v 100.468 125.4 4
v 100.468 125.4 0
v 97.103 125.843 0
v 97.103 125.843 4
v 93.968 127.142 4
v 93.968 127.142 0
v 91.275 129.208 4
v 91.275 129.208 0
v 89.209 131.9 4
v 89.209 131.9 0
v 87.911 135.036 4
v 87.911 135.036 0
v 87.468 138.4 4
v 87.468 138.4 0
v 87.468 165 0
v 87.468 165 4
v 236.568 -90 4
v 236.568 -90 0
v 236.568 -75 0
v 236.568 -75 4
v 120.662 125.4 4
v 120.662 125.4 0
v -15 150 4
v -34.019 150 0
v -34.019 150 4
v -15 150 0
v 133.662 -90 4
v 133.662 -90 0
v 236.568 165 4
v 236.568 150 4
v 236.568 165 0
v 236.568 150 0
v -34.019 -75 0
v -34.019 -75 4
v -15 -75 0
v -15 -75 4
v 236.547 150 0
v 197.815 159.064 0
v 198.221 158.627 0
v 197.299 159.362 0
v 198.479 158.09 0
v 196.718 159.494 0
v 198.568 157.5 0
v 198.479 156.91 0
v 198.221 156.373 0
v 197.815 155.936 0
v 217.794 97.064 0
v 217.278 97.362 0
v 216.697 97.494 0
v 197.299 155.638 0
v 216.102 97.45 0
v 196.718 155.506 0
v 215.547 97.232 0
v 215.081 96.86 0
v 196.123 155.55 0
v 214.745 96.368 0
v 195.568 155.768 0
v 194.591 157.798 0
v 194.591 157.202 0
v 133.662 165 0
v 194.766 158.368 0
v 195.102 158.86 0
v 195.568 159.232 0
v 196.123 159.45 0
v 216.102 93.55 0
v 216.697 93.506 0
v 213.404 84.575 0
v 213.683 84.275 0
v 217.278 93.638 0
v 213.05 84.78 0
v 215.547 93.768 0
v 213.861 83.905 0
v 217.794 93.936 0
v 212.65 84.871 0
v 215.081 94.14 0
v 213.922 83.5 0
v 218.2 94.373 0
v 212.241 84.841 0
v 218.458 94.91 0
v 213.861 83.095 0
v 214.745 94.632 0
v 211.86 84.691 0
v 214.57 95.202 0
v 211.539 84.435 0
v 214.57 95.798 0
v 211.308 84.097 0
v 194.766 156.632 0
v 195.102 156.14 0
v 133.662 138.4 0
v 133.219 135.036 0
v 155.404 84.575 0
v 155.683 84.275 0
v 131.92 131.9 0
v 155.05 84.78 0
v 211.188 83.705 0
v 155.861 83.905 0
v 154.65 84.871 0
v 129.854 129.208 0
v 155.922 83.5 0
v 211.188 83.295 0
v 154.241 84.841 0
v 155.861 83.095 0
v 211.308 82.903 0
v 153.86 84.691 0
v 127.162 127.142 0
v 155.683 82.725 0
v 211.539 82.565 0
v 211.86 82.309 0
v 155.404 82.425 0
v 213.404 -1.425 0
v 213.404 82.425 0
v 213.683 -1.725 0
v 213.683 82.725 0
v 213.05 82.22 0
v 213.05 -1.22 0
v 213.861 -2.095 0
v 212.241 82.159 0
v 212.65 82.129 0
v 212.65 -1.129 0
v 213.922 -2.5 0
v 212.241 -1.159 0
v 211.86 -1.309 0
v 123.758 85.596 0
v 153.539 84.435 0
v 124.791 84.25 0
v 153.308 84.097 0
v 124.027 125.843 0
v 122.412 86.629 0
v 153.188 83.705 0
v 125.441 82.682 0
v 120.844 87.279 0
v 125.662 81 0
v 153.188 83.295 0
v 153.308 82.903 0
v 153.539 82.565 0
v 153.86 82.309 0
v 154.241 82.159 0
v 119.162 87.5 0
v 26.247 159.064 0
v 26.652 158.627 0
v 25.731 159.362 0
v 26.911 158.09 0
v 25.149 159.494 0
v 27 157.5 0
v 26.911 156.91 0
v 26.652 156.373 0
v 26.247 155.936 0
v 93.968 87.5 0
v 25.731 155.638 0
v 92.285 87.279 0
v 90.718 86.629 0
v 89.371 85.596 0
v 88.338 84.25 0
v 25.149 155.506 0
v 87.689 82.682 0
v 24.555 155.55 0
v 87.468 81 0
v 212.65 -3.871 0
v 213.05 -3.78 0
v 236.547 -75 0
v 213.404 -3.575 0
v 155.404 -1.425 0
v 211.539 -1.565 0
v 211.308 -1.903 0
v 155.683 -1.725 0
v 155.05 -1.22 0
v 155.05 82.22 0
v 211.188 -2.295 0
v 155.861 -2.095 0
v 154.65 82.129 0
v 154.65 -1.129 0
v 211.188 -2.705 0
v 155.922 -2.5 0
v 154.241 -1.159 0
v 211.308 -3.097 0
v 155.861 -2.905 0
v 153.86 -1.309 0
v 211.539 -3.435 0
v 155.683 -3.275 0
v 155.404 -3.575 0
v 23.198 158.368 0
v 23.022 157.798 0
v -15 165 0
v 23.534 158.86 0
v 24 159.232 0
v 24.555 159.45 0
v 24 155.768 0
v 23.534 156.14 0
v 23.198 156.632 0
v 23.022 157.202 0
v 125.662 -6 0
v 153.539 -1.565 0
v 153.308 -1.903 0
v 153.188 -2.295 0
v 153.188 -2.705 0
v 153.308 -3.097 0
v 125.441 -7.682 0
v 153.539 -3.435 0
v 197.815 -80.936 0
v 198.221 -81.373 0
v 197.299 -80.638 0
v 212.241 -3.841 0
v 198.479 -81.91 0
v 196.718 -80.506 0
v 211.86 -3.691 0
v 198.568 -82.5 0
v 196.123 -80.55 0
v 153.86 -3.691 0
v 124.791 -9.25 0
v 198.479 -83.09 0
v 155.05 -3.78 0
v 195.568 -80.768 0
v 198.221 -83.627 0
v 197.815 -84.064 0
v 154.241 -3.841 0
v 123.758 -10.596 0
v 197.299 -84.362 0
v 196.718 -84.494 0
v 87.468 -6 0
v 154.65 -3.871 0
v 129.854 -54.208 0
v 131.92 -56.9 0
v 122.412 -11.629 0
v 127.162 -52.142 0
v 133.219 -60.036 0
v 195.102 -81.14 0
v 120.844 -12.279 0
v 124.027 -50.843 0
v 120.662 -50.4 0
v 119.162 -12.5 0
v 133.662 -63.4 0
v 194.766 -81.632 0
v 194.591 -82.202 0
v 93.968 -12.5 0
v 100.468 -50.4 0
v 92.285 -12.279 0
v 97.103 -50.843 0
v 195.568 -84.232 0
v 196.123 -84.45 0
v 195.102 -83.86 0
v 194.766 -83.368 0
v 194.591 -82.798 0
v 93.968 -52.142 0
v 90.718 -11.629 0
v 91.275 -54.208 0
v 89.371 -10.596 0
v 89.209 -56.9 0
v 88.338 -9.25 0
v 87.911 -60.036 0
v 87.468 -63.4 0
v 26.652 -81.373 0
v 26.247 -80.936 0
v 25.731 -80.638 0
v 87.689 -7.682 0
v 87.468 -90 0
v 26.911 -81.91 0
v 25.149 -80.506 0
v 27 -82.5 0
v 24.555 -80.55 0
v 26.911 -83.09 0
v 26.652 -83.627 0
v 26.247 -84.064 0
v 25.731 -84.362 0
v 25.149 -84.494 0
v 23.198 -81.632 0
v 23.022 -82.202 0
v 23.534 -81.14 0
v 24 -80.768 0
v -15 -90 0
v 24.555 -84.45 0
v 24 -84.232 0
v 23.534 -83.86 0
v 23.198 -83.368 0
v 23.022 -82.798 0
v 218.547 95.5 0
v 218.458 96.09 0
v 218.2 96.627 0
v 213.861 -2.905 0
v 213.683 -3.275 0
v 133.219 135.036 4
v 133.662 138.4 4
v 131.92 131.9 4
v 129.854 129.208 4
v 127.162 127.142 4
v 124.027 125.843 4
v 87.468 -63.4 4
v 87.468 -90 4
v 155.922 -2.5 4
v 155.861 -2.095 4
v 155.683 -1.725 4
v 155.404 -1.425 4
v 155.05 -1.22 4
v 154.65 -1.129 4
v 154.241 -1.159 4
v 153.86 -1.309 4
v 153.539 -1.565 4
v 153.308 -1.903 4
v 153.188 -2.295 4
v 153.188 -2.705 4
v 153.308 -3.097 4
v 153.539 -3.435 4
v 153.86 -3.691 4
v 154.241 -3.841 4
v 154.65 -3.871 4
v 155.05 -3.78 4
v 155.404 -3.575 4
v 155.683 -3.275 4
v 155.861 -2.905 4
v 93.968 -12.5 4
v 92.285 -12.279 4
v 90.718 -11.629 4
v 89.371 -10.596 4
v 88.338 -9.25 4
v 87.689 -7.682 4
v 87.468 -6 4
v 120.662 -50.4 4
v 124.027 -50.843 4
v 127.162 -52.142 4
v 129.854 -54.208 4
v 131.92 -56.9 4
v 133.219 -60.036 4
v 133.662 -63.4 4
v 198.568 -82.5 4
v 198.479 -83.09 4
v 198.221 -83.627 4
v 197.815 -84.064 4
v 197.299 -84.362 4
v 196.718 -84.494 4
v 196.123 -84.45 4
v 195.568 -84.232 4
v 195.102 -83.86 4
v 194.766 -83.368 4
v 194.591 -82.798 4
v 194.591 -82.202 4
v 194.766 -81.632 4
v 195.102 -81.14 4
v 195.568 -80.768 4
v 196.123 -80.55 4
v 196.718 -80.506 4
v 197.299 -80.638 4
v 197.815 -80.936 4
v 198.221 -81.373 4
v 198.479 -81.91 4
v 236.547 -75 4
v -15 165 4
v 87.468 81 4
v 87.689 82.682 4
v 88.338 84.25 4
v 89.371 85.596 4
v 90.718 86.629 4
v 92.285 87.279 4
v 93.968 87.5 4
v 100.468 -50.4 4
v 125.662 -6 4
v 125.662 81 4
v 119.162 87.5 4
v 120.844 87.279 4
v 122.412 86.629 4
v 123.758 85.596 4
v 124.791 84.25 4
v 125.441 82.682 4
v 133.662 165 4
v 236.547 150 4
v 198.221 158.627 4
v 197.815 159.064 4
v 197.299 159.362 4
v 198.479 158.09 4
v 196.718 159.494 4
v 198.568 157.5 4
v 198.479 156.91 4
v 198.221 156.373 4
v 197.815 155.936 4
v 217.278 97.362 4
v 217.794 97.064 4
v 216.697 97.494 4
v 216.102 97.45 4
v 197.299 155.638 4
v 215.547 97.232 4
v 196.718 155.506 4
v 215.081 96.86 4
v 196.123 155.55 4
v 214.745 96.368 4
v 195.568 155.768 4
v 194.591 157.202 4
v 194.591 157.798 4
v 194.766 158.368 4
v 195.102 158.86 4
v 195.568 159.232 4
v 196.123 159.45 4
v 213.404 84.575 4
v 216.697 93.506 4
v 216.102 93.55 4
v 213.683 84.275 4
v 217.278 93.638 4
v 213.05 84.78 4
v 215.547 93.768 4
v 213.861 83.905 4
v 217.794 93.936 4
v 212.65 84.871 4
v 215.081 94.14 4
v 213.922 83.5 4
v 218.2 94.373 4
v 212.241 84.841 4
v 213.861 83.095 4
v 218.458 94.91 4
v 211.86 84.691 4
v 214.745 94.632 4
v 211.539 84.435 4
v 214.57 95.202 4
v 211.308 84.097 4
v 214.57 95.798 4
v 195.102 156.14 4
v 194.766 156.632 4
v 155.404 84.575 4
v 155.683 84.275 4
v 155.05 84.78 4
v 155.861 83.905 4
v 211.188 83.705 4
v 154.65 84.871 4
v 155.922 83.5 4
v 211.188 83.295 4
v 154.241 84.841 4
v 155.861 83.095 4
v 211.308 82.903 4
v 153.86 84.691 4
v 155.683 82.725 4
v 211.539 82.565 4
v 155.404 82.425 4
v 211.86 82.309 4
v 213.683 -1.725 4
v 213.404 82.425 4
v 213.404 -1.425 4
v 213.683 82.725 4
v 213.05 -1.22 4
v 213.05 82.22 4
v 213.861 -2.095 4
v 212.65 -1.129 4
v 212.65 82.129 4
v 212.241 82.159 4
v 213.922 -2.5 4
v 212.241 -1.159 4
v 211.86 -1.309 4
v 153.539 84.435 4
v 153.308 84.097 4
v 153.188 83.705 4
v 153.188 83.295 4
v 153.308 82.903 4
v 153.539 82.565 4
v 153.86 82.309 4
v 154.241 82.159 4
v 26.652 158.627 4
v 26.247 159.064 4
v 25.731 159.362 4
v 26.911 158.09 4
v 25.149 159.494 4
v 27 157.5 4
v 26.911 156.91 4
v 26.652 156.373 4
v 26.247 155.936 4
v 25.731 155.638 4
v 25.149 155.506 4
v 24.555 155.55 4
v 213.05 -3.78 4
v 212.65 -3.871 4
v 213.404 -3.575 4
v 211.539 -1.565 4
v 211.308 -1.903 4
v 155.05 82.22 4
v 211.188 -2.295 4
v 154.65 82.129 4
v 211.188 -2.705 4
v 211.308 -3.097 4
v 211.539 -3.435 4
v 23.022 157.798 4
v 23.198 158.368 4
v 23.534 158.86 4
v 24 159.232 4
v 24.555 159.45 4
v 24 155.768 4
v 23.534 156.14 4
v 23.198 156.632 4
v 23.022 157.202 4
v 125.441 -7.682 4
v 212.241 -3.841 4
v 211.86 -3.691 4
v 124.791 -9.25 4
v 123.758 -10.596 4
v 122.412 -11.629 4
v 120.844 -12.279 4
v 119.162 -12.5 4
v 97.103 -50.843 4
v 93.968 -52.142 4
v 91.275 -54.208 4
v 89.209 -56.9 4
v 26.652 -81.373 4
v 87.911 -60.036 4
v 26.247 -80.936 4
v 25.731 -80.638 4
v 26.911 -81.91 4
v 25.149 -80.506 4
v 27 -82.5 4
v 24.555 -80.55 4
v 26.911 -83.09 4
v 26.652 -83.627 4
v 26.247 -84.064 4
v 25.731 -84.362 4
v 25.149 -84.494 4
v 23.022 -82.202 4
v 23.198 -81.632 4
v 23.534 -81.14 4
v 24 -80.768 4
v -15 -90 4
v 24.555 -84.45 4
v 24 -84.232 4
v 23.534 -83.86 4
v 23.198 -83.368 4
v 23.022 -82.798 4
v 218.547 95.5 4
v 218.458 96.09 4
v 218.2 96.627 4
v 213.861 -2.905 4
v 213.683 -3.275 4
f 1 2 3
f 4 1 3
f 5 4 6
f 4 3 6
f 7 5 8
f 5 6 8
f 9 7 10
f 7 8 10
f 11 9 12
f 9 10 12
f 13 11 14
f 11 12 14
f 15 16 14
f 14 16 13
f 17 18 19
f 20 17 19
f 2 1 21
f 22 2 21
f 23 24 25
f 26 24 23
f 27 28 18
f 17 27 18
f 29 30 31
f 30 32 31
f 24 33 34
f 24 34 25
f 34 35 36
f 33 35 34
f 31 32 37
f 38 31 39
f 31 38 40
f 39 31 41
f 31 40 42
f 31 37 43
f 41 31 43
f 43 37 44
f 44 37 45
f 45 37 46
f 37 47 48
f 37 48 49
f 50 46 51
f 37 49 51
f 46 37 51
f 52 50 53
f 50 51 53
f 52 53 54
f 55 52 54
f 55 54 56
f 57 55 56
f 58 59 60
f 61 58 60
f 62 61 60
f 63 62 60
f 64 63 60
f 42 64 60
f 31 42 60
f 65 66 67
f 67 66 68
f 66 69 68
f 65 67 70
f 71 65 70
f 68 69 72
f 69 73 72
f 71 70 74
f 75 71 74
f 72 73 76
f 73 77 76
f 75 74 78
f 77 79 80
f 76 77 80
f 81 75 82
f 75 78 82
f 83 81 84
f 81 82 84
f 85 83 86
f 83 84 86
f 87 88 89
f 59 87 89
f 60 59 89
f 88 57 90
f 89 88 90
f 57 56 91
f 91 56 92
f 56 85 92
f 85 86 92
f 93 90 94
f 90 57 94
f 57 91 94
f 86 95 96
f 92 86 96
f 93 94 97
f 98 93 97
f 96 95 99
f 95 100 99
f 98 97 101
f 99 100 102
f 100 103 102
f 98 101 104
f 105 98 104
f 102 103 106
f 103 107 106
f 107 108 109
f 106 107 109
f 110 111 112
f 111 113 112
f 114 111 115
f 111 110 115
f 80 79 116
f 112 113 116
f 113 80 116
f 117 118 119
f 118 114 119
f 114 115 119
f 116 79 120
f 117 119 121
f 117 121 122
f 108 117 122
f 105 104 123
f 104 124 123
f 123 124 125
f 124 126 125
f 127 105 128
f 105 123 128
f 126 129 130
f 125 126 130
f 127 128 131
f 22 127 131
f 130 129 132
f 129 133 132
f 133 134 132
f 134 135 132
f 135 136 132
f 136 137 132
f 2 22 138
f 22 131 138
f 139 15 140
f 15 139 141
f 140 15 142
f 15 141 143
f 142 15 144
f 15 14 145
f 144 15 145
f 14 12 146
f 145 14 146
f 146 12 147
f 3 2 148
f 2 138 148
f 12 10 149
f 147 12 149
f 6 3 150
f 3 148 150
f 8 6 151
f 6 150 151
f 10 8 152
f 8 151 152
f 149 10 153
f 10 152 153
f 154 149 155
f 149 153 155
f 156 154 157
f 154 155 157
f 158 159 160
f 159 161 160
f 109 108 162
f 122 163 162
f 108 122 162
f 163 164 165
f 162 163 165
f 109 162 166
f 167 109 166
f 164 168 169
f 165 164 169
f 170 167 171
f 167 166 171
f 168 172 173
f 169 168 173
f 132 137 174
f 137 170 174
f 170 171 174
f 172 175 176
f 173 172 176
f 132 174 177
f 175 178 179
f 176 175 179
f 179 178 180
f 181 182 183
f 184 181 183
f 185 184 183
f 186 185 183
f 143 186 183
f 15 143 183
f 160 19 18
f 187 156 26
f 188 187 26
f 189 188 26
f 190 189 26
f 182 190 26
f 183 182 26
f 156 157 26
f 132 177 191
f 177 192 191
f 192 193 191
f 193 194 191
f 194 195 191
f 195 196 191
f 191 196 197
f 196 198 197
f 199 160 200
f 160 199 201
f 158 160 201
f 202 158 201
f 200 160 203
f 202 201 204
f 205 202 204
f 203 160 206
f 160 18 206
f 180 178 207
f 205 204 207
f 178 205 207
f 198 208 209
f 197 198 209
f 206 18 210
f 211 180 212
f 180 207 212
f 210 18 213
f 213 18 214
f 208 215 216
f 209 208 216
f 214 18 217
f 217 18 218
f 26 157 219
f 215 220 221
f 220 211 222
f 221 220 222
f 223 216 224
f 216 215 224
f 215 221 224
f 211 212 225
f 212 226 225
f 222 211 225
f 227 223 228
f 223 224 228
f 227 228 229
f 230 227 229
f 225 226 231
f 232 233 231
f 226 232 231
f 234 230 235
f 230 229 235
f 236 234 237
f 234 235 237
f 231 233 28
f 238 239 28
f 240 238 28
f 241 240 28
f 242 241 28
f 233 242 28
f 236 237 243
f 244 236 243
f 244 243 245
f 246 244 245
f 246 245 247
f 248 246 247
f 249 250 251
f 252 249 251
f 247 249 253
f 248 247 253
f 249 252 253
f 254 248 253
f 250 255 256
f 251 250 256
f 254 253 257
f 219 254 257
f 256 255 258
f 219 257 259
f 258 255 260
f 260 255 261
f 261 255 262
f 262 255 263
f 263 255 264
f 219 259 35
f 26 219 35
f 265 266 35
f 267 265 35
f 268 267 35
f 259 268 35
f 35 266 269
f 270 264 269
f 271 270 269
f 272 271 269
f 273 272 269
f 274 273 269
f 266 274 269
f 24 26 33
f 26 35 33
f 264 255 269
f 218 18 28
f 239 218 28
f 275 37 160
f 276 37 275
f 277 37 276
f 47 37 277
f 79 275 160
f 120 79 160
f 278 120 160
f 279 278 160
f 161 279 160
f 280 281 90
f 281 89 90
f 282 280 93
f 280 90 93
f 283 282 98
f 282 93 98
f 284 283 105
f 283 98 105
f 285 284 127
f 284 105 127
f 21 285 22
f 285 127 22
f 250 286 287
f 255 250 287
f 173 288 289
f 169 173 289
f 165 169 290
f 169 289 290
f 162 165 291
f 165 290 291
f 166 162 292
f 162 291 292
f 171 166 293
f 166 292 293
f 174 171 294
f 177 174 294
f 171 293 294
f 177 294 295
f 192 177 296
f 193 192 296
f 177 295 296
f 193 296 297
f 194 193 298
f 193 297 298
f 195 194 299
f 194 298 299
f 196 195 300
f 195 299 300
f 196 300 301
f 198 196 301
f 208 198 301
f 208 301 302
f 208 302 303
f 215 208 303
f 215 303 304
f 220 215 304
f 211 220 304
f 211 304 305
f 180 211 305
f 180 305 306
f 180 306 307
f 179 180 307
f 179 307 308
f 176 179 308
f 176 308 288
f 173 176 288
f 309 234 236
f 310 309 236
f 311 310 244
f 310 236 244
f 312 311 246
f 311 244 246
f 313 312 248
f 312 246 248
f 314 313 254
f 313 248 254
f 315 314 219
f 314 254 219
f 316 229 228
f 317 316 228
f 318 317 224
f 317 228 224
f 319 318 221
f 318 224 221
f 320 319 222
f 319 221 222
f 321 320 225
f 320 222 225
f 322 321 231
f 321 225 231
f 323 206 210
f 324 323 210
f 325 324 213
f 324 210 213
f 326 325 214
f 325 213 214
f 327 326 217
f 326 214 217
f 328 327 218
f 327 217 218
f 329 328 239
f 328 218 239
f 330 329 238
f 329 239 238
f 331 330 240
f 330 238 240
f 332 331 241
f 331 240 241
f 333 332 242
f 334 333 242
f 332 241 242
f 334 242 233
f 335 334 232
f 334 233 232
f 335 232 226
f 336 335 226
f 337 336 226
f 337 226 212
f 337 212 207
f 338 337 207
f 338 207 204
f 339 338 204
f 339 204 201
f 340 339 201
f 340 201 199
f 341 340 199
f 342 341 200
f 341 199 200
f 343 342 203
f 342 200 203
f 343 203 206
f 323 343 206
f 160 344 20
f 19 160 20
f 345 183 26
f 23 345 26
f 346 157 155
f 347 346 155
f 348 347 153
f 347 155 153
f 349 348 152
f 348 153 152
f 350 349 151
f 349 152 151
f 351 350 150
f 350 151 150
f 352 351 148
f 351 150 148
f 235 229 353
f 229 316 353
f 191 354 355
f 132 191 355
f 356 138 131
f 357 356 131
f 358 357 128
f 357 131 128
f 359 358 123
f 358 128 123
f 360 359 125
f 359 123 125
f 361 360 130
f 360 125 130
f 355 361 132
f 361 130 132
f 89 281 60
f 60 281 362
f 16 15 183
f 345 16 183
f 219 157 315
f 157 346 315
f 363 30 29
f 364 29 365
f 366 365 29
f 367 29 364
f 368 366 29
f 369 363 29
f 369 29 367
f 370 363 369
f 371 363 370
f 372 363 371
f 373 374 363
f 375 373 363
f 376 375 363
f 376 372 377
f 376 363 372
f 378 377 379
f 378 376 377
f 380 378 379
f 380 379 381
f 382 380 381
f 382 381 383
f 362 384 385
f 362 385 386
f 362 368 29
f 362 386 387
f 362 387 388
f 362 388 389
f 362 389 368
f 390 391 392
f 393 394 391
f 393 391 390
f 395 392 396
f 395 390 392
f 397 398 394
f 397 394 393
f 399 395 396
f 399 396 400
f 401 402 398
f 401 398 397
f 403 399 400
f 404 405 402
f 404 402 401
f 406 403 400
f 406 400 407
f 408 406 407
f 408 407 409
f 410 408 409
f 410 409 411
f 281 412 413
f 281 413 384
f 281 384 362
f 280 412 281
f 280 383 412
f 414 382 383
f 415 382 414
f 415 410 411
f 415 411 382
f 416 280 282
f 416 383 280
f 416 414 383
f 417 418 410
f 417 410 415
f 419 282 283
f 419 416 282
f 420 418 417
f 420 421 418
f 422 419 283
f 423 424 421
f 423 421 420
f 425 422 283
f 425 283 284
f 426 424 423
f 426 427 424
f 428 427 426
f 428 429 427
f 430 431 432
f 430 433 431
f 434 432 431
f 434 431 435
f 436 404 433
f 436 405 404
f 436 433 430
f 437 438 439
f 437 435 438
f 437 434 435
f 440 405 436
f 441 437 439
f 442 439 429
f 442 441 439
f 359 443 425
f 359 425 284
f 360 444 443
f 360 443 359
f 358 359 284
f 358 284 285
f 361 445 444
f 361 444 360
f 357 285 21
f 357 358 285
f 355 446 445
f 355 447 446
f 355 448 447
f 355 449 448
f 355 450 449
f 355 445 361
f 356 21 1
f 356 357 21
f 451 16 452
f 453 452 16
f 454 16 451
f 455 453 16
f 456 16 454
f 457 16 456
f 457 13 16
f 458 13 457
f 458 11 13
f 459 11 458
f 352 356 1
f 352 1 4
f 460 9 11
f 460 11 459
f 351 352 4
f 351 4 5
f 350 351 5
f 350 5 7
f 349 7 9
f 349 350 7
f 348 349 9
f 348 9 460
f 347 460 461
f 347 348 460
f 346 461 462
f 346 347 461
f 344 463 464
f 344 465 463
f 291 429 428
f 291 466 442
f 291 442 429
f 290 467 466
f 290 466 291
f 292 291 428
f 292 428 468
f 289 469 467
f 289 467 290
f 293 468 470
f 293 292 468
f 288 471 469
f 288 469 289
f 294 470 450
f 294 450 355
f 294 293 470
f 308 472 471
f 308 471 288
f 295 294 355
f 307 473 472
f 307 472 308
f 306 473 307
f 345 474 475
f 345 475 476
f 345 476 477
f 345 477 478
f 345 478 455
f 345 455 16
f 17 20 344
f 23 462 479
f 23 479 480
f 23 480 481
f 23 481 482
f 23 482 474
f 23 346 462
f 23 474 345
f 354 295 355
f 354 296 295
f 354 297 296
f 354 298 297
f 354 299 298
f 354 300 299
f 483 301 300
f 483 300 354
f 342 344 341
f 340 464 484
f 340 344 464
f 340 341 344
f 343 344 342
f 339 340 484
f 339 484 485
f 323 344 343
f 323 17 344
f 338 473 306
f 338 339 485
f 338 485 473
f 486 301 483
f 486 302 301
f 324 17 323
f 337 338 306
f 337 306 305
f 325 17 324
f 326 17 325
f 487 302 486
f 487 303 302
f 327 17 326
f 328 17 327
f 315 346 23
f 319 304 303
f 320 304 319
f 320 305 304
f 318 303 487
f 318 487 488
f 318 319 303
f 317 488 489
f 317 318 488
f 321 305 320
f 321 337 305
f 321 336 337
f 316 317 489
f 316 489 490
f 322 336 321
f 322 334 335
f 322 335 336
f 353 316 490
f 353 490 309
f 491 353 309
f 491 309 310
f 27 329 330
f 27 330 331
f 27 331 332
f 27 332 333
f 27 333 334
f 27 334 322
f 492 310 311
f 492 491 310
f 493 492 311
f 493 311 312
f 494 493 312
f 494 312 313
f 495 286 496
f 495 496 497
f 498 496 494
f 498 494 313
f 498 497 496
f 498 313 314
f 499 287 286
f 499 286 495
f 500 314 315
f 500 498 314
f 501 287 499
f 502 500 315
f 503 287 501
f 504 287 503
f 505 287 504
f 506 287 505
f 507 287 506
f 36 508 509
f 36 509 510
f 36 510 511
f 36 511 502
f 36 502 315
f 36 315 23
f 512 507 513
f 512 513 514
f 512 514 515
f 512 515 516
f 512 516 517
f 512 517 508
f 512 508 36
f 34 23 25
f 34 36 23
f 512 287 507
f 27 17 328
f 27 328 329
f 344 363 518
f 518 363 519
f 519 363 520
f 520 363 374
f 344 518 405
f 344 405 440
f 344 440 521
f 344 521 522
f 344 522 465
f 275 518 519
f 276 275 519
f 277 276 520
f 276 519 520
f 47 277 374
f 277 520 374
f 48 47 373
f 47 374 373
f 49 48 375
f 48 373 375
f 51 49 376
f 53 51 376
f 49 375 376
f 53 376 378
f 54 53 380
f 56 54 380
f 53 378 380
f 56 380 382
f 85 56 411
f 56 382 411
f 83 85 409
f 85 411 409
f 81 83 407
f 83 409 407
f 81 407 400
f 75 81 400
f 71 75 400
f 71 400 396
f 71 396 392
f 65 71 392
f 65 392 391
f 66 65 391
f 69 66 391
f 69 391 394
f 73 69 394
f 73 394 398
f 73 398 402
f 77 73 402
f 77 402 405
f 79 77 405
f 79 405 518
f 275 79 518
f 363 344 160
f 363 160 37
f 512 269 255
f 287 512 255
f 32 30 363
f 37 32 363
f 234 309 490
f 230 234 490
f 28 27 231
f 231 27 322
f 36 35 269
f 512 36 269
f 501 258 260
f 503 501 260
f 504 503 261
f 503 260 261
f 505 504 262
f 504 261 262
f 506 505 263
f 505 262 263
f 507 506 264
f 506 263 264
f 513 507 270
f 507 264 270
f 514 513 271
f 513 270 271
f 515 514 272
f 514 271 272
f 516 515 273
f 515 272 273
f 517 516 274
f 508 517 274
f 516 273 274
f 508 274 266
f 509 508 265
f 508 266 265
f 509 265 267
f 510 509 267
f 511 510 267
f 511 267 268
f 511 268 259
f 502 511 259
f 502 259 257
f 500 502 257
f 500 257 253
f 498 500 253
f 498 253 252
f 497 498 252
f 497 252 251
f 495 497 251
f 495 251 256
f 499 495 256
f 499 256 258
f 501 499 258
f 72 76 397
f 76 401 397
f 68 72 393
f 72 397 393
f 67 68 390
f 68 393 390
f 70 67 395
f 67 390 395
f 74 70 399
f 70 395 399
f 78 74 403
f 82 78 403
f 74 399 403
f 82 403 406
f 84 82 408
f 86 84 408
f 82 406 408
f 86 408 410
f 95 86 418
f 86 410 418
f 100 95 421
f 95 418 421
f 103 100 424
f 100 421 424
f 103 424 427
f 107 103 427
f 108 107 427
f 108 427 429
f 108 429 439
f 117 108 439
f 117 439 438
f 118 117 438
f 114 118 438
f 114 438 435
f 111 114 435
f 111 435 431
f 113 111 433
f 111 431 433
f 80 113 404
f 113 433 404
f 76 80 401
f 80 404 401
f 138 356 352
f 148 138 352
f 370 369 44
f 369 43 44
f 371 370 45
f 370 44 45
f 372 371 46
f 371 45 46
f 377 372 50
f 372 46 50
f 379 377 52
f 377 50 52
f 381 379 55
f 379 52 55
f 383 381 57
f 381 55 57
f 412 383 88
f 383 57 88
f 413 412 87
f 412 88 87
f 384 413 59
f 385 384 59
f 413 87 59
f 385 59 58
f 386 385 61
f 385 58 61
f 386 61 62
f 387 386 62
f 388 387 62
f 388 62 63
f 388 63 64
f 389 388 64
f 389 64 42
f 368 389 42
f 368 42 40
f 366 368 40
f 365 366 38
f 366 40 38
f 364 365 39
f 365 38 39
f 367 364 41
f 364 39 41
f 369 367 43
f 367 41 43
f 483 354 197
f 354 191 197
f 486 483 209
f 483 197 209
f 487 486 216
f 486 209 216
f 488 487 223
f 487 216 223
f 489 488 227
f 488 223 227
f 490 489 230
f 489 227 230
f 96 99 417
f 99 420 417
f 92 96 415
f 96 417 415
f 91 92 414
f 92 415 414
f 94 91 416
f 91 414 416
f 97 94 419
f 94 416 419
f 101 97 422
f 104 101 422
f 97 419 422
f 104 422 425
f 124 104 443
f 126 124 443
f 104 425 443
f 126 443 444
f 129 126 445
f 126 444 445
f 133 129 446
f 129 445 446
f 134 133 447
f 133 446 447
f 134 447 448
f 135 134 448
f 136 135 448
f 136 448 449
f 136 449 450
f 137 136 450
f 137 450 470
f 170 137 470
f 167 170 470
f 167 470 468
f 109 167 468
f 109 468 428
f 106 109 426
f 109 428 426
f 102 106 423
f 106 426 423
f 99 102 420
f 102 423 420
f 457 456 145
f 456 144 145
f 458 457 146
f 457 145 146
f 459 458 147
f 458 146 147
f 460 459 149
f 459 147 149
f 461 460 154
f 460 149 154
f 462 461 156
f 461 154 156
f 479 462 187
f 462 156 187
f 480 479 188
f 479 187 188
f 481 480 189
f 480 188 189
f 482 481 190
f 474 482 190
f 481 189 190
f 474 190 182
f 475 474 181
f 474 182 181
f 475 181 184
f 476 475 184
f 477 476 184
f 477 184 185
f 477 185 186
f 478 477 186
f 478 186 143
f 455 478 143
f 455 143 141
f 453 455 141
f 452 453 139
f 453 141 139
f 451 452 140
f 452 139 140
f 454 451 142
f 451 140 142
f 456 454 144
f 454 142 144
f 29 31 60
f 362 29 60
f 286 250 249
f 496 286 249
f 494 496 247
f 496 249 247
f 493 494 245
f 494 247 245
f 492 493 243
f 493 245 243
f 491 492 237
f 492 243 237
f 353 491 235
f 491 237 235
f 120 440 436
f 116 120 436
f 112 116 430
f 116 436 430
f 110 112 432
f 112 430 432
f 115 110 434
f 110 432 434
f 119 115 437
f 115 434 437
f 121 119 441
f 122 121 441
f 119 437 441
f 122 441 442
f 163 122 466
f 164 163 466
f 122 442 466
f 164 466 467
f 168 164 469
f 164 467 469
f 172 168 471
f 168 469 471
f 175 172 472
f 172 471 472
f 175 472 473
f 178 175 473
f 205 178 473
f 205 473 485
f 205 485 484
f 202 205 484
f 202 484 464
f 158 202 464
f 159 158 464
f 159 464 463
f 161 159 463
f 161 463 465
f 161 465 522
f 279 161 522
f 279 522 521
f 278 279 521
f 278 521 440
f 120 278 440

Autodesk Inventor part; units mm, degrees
ref_plane "YZ Plane" through (0, 0, 0) normal (1, 0, 0) x (0, 1, 0)
ref_plane "XZ Plane" through (0, 0, 0) normal (0, 1, 0) x (-1, 0, 0)
sketch "Эскиз1" plane through (0, 0, 0) normal (0, 0, 1) x (1, 0, 0)
  circle A0 centre (25, 157.5) radius 2
  circle A1 centre (196.5682, 157.5) radius 2
  line L0 (236.5682, 150) -> (236.5682, 165) projected
  line L1 (-34.0192, 150) -> (-15, 150)
  line L2 (-34.0192, 150) -> (-15, 150)
  line L3 (-34.0192, 37.5) -> (-34.0192, 150)
  line L4 (236.5682, 165) -> (-15, 165)
  line L5 (236.5682, 37.5) -> (236.5682, 165)
  line L6 (-34.0192, 37.5) -> (236.5682, 37.5)
  line L7 (-15, 165) -> (-15, 150)
  dimension "d5" = 127.5
  dimension "d6" = 7.5
  dimension "d7" = 7.5
  dimension "d9" = 15
extrude "Выдавливание1" add sketch "Эскиз1" along normal blind 4
sketch "Эскиз2" plane through (0, 0, 4) normal (0, 0, 1) x (1, 0, 0)
  line L0 (236.5682, 150) -> (199.2972, 150)
  line L1 (-15, 150) -> (-34.0192, 150) projected
  line L2 (-34.0192, 37.5) -> (236.5682, 37.5) projected
  line L3 (199.2972, 150) -> (236.5682, 150)
  line L4 (236.5682, 150) -> (236.5682, 37.5)
  line L5 (236.5682, 37.5) -> (199.2972, 37.5)
  line L6 (199.2972, 37.5) -> (199.2972, 150)
  point P0 (0, 0)
  point P1 (-24.5096, 150)
  point P2 (-15, -15)
extrude "Выдавливание2" cut sketch "Эскиз2" against normal blind 4
mirror "Зеркальное отражение2" about plane through (-34.0192, 37.5, 0) normal (0, -1, 0) of "Выдавливание1", "Выдавливание2"
sketch "Эскиз3" plane through (0, 0, 4) normal (0, 0, 1) x (1, 0, 0)
  line L0 (236.5682, -90) -> (-15, -90) projected
  line L1 (87.4676, -90) -> (133.662, -90)
  line L2 (133.662, -90) -> (133.662, -50.4003)
  line L3 (133.662, -50.4003) -> (87.4676, -50.4003)
  line L4 (87.4676, -50.4003) -> (87.4676, -90)
  point P0 (0, 0)
extrude "Выдавливание3" cut sketch "Эскиз3" against normal blind 10
ref_plane "РабПлоскость1" through (199.2972, 37.5, 4) normal (0, 1, 0) x (1, 0, 0)
mirror "Зеркальное отражение3" about plane through (199.2972, 37.5, 4) normal (0, 1, 0) of "Выдавливание3"
move faces "Перенос1" translate (37.25, 0, 0) faces at (199.2972, 0, 2.6667)
sketch "Эскиз4" plane through (0, 0, 4) normal (0, 0, 1) x (1, 0, 0)
  circle A0 centre (154.5472, 83.5) radius 1.375 projected
  circle A1 centre (154.5472, -2.5) radius 1.375 projected
  circle A2 centre (212.5472, -2.5) radius 1.375 projected
  circle A3 centre (212.5472, 83.5) radius 1.375 projected
  circle A4 centre (216.5472, 95.5) radius 2 projected
  circle A5 centre (216.5472, -20.5) radius 2 projected
  line L0 (215.9472, 87.5) -> (138.1472, 87.5) projected
  line L1 (138.1472, -12.5) -> (215.9472, -12.5) projected
  line L2 (125.662, 87.5) -> (87.4676, 87.5)
  line L3 (87.4676, 87.5) -> (87.4676, -12.5)
  line L4 (87.4676, -12.5) -> (125.662, -12.5)
  line L5 (125.662, -12.5) -> (125.662, 87.5)
  line L6 (87.4676, -90) -> (87.4676, -50.4003) projected
  line L7 (133.662, -50.4003) -> (133.662, -90) projected
  point P0 (0, 0)
  dimension "d15" = 8
extrude "Выдавливание4" cut sketch "Эскиз4" against normal blind 10 contours A0 | A1 | A2 | A3 | A4 | L5 L4 L3 L2
fillet "Сопряжение1" radius 13 4 edges at (87.4676, 125.4003, 2) (133.662, 125.4003, 2) (87.4676, -50.4003, 2) (133.662, -50.4003, 2)
fillet "Сопряжение2" radius 6.5 4 edges at (87.4676, -12.5, 2) (125.662, -12.5, 2) (87.4676, 87.5, 2) (125.662, 87.5, 2)
properties part number "KB33-046-004-018 - Полка электроники"
